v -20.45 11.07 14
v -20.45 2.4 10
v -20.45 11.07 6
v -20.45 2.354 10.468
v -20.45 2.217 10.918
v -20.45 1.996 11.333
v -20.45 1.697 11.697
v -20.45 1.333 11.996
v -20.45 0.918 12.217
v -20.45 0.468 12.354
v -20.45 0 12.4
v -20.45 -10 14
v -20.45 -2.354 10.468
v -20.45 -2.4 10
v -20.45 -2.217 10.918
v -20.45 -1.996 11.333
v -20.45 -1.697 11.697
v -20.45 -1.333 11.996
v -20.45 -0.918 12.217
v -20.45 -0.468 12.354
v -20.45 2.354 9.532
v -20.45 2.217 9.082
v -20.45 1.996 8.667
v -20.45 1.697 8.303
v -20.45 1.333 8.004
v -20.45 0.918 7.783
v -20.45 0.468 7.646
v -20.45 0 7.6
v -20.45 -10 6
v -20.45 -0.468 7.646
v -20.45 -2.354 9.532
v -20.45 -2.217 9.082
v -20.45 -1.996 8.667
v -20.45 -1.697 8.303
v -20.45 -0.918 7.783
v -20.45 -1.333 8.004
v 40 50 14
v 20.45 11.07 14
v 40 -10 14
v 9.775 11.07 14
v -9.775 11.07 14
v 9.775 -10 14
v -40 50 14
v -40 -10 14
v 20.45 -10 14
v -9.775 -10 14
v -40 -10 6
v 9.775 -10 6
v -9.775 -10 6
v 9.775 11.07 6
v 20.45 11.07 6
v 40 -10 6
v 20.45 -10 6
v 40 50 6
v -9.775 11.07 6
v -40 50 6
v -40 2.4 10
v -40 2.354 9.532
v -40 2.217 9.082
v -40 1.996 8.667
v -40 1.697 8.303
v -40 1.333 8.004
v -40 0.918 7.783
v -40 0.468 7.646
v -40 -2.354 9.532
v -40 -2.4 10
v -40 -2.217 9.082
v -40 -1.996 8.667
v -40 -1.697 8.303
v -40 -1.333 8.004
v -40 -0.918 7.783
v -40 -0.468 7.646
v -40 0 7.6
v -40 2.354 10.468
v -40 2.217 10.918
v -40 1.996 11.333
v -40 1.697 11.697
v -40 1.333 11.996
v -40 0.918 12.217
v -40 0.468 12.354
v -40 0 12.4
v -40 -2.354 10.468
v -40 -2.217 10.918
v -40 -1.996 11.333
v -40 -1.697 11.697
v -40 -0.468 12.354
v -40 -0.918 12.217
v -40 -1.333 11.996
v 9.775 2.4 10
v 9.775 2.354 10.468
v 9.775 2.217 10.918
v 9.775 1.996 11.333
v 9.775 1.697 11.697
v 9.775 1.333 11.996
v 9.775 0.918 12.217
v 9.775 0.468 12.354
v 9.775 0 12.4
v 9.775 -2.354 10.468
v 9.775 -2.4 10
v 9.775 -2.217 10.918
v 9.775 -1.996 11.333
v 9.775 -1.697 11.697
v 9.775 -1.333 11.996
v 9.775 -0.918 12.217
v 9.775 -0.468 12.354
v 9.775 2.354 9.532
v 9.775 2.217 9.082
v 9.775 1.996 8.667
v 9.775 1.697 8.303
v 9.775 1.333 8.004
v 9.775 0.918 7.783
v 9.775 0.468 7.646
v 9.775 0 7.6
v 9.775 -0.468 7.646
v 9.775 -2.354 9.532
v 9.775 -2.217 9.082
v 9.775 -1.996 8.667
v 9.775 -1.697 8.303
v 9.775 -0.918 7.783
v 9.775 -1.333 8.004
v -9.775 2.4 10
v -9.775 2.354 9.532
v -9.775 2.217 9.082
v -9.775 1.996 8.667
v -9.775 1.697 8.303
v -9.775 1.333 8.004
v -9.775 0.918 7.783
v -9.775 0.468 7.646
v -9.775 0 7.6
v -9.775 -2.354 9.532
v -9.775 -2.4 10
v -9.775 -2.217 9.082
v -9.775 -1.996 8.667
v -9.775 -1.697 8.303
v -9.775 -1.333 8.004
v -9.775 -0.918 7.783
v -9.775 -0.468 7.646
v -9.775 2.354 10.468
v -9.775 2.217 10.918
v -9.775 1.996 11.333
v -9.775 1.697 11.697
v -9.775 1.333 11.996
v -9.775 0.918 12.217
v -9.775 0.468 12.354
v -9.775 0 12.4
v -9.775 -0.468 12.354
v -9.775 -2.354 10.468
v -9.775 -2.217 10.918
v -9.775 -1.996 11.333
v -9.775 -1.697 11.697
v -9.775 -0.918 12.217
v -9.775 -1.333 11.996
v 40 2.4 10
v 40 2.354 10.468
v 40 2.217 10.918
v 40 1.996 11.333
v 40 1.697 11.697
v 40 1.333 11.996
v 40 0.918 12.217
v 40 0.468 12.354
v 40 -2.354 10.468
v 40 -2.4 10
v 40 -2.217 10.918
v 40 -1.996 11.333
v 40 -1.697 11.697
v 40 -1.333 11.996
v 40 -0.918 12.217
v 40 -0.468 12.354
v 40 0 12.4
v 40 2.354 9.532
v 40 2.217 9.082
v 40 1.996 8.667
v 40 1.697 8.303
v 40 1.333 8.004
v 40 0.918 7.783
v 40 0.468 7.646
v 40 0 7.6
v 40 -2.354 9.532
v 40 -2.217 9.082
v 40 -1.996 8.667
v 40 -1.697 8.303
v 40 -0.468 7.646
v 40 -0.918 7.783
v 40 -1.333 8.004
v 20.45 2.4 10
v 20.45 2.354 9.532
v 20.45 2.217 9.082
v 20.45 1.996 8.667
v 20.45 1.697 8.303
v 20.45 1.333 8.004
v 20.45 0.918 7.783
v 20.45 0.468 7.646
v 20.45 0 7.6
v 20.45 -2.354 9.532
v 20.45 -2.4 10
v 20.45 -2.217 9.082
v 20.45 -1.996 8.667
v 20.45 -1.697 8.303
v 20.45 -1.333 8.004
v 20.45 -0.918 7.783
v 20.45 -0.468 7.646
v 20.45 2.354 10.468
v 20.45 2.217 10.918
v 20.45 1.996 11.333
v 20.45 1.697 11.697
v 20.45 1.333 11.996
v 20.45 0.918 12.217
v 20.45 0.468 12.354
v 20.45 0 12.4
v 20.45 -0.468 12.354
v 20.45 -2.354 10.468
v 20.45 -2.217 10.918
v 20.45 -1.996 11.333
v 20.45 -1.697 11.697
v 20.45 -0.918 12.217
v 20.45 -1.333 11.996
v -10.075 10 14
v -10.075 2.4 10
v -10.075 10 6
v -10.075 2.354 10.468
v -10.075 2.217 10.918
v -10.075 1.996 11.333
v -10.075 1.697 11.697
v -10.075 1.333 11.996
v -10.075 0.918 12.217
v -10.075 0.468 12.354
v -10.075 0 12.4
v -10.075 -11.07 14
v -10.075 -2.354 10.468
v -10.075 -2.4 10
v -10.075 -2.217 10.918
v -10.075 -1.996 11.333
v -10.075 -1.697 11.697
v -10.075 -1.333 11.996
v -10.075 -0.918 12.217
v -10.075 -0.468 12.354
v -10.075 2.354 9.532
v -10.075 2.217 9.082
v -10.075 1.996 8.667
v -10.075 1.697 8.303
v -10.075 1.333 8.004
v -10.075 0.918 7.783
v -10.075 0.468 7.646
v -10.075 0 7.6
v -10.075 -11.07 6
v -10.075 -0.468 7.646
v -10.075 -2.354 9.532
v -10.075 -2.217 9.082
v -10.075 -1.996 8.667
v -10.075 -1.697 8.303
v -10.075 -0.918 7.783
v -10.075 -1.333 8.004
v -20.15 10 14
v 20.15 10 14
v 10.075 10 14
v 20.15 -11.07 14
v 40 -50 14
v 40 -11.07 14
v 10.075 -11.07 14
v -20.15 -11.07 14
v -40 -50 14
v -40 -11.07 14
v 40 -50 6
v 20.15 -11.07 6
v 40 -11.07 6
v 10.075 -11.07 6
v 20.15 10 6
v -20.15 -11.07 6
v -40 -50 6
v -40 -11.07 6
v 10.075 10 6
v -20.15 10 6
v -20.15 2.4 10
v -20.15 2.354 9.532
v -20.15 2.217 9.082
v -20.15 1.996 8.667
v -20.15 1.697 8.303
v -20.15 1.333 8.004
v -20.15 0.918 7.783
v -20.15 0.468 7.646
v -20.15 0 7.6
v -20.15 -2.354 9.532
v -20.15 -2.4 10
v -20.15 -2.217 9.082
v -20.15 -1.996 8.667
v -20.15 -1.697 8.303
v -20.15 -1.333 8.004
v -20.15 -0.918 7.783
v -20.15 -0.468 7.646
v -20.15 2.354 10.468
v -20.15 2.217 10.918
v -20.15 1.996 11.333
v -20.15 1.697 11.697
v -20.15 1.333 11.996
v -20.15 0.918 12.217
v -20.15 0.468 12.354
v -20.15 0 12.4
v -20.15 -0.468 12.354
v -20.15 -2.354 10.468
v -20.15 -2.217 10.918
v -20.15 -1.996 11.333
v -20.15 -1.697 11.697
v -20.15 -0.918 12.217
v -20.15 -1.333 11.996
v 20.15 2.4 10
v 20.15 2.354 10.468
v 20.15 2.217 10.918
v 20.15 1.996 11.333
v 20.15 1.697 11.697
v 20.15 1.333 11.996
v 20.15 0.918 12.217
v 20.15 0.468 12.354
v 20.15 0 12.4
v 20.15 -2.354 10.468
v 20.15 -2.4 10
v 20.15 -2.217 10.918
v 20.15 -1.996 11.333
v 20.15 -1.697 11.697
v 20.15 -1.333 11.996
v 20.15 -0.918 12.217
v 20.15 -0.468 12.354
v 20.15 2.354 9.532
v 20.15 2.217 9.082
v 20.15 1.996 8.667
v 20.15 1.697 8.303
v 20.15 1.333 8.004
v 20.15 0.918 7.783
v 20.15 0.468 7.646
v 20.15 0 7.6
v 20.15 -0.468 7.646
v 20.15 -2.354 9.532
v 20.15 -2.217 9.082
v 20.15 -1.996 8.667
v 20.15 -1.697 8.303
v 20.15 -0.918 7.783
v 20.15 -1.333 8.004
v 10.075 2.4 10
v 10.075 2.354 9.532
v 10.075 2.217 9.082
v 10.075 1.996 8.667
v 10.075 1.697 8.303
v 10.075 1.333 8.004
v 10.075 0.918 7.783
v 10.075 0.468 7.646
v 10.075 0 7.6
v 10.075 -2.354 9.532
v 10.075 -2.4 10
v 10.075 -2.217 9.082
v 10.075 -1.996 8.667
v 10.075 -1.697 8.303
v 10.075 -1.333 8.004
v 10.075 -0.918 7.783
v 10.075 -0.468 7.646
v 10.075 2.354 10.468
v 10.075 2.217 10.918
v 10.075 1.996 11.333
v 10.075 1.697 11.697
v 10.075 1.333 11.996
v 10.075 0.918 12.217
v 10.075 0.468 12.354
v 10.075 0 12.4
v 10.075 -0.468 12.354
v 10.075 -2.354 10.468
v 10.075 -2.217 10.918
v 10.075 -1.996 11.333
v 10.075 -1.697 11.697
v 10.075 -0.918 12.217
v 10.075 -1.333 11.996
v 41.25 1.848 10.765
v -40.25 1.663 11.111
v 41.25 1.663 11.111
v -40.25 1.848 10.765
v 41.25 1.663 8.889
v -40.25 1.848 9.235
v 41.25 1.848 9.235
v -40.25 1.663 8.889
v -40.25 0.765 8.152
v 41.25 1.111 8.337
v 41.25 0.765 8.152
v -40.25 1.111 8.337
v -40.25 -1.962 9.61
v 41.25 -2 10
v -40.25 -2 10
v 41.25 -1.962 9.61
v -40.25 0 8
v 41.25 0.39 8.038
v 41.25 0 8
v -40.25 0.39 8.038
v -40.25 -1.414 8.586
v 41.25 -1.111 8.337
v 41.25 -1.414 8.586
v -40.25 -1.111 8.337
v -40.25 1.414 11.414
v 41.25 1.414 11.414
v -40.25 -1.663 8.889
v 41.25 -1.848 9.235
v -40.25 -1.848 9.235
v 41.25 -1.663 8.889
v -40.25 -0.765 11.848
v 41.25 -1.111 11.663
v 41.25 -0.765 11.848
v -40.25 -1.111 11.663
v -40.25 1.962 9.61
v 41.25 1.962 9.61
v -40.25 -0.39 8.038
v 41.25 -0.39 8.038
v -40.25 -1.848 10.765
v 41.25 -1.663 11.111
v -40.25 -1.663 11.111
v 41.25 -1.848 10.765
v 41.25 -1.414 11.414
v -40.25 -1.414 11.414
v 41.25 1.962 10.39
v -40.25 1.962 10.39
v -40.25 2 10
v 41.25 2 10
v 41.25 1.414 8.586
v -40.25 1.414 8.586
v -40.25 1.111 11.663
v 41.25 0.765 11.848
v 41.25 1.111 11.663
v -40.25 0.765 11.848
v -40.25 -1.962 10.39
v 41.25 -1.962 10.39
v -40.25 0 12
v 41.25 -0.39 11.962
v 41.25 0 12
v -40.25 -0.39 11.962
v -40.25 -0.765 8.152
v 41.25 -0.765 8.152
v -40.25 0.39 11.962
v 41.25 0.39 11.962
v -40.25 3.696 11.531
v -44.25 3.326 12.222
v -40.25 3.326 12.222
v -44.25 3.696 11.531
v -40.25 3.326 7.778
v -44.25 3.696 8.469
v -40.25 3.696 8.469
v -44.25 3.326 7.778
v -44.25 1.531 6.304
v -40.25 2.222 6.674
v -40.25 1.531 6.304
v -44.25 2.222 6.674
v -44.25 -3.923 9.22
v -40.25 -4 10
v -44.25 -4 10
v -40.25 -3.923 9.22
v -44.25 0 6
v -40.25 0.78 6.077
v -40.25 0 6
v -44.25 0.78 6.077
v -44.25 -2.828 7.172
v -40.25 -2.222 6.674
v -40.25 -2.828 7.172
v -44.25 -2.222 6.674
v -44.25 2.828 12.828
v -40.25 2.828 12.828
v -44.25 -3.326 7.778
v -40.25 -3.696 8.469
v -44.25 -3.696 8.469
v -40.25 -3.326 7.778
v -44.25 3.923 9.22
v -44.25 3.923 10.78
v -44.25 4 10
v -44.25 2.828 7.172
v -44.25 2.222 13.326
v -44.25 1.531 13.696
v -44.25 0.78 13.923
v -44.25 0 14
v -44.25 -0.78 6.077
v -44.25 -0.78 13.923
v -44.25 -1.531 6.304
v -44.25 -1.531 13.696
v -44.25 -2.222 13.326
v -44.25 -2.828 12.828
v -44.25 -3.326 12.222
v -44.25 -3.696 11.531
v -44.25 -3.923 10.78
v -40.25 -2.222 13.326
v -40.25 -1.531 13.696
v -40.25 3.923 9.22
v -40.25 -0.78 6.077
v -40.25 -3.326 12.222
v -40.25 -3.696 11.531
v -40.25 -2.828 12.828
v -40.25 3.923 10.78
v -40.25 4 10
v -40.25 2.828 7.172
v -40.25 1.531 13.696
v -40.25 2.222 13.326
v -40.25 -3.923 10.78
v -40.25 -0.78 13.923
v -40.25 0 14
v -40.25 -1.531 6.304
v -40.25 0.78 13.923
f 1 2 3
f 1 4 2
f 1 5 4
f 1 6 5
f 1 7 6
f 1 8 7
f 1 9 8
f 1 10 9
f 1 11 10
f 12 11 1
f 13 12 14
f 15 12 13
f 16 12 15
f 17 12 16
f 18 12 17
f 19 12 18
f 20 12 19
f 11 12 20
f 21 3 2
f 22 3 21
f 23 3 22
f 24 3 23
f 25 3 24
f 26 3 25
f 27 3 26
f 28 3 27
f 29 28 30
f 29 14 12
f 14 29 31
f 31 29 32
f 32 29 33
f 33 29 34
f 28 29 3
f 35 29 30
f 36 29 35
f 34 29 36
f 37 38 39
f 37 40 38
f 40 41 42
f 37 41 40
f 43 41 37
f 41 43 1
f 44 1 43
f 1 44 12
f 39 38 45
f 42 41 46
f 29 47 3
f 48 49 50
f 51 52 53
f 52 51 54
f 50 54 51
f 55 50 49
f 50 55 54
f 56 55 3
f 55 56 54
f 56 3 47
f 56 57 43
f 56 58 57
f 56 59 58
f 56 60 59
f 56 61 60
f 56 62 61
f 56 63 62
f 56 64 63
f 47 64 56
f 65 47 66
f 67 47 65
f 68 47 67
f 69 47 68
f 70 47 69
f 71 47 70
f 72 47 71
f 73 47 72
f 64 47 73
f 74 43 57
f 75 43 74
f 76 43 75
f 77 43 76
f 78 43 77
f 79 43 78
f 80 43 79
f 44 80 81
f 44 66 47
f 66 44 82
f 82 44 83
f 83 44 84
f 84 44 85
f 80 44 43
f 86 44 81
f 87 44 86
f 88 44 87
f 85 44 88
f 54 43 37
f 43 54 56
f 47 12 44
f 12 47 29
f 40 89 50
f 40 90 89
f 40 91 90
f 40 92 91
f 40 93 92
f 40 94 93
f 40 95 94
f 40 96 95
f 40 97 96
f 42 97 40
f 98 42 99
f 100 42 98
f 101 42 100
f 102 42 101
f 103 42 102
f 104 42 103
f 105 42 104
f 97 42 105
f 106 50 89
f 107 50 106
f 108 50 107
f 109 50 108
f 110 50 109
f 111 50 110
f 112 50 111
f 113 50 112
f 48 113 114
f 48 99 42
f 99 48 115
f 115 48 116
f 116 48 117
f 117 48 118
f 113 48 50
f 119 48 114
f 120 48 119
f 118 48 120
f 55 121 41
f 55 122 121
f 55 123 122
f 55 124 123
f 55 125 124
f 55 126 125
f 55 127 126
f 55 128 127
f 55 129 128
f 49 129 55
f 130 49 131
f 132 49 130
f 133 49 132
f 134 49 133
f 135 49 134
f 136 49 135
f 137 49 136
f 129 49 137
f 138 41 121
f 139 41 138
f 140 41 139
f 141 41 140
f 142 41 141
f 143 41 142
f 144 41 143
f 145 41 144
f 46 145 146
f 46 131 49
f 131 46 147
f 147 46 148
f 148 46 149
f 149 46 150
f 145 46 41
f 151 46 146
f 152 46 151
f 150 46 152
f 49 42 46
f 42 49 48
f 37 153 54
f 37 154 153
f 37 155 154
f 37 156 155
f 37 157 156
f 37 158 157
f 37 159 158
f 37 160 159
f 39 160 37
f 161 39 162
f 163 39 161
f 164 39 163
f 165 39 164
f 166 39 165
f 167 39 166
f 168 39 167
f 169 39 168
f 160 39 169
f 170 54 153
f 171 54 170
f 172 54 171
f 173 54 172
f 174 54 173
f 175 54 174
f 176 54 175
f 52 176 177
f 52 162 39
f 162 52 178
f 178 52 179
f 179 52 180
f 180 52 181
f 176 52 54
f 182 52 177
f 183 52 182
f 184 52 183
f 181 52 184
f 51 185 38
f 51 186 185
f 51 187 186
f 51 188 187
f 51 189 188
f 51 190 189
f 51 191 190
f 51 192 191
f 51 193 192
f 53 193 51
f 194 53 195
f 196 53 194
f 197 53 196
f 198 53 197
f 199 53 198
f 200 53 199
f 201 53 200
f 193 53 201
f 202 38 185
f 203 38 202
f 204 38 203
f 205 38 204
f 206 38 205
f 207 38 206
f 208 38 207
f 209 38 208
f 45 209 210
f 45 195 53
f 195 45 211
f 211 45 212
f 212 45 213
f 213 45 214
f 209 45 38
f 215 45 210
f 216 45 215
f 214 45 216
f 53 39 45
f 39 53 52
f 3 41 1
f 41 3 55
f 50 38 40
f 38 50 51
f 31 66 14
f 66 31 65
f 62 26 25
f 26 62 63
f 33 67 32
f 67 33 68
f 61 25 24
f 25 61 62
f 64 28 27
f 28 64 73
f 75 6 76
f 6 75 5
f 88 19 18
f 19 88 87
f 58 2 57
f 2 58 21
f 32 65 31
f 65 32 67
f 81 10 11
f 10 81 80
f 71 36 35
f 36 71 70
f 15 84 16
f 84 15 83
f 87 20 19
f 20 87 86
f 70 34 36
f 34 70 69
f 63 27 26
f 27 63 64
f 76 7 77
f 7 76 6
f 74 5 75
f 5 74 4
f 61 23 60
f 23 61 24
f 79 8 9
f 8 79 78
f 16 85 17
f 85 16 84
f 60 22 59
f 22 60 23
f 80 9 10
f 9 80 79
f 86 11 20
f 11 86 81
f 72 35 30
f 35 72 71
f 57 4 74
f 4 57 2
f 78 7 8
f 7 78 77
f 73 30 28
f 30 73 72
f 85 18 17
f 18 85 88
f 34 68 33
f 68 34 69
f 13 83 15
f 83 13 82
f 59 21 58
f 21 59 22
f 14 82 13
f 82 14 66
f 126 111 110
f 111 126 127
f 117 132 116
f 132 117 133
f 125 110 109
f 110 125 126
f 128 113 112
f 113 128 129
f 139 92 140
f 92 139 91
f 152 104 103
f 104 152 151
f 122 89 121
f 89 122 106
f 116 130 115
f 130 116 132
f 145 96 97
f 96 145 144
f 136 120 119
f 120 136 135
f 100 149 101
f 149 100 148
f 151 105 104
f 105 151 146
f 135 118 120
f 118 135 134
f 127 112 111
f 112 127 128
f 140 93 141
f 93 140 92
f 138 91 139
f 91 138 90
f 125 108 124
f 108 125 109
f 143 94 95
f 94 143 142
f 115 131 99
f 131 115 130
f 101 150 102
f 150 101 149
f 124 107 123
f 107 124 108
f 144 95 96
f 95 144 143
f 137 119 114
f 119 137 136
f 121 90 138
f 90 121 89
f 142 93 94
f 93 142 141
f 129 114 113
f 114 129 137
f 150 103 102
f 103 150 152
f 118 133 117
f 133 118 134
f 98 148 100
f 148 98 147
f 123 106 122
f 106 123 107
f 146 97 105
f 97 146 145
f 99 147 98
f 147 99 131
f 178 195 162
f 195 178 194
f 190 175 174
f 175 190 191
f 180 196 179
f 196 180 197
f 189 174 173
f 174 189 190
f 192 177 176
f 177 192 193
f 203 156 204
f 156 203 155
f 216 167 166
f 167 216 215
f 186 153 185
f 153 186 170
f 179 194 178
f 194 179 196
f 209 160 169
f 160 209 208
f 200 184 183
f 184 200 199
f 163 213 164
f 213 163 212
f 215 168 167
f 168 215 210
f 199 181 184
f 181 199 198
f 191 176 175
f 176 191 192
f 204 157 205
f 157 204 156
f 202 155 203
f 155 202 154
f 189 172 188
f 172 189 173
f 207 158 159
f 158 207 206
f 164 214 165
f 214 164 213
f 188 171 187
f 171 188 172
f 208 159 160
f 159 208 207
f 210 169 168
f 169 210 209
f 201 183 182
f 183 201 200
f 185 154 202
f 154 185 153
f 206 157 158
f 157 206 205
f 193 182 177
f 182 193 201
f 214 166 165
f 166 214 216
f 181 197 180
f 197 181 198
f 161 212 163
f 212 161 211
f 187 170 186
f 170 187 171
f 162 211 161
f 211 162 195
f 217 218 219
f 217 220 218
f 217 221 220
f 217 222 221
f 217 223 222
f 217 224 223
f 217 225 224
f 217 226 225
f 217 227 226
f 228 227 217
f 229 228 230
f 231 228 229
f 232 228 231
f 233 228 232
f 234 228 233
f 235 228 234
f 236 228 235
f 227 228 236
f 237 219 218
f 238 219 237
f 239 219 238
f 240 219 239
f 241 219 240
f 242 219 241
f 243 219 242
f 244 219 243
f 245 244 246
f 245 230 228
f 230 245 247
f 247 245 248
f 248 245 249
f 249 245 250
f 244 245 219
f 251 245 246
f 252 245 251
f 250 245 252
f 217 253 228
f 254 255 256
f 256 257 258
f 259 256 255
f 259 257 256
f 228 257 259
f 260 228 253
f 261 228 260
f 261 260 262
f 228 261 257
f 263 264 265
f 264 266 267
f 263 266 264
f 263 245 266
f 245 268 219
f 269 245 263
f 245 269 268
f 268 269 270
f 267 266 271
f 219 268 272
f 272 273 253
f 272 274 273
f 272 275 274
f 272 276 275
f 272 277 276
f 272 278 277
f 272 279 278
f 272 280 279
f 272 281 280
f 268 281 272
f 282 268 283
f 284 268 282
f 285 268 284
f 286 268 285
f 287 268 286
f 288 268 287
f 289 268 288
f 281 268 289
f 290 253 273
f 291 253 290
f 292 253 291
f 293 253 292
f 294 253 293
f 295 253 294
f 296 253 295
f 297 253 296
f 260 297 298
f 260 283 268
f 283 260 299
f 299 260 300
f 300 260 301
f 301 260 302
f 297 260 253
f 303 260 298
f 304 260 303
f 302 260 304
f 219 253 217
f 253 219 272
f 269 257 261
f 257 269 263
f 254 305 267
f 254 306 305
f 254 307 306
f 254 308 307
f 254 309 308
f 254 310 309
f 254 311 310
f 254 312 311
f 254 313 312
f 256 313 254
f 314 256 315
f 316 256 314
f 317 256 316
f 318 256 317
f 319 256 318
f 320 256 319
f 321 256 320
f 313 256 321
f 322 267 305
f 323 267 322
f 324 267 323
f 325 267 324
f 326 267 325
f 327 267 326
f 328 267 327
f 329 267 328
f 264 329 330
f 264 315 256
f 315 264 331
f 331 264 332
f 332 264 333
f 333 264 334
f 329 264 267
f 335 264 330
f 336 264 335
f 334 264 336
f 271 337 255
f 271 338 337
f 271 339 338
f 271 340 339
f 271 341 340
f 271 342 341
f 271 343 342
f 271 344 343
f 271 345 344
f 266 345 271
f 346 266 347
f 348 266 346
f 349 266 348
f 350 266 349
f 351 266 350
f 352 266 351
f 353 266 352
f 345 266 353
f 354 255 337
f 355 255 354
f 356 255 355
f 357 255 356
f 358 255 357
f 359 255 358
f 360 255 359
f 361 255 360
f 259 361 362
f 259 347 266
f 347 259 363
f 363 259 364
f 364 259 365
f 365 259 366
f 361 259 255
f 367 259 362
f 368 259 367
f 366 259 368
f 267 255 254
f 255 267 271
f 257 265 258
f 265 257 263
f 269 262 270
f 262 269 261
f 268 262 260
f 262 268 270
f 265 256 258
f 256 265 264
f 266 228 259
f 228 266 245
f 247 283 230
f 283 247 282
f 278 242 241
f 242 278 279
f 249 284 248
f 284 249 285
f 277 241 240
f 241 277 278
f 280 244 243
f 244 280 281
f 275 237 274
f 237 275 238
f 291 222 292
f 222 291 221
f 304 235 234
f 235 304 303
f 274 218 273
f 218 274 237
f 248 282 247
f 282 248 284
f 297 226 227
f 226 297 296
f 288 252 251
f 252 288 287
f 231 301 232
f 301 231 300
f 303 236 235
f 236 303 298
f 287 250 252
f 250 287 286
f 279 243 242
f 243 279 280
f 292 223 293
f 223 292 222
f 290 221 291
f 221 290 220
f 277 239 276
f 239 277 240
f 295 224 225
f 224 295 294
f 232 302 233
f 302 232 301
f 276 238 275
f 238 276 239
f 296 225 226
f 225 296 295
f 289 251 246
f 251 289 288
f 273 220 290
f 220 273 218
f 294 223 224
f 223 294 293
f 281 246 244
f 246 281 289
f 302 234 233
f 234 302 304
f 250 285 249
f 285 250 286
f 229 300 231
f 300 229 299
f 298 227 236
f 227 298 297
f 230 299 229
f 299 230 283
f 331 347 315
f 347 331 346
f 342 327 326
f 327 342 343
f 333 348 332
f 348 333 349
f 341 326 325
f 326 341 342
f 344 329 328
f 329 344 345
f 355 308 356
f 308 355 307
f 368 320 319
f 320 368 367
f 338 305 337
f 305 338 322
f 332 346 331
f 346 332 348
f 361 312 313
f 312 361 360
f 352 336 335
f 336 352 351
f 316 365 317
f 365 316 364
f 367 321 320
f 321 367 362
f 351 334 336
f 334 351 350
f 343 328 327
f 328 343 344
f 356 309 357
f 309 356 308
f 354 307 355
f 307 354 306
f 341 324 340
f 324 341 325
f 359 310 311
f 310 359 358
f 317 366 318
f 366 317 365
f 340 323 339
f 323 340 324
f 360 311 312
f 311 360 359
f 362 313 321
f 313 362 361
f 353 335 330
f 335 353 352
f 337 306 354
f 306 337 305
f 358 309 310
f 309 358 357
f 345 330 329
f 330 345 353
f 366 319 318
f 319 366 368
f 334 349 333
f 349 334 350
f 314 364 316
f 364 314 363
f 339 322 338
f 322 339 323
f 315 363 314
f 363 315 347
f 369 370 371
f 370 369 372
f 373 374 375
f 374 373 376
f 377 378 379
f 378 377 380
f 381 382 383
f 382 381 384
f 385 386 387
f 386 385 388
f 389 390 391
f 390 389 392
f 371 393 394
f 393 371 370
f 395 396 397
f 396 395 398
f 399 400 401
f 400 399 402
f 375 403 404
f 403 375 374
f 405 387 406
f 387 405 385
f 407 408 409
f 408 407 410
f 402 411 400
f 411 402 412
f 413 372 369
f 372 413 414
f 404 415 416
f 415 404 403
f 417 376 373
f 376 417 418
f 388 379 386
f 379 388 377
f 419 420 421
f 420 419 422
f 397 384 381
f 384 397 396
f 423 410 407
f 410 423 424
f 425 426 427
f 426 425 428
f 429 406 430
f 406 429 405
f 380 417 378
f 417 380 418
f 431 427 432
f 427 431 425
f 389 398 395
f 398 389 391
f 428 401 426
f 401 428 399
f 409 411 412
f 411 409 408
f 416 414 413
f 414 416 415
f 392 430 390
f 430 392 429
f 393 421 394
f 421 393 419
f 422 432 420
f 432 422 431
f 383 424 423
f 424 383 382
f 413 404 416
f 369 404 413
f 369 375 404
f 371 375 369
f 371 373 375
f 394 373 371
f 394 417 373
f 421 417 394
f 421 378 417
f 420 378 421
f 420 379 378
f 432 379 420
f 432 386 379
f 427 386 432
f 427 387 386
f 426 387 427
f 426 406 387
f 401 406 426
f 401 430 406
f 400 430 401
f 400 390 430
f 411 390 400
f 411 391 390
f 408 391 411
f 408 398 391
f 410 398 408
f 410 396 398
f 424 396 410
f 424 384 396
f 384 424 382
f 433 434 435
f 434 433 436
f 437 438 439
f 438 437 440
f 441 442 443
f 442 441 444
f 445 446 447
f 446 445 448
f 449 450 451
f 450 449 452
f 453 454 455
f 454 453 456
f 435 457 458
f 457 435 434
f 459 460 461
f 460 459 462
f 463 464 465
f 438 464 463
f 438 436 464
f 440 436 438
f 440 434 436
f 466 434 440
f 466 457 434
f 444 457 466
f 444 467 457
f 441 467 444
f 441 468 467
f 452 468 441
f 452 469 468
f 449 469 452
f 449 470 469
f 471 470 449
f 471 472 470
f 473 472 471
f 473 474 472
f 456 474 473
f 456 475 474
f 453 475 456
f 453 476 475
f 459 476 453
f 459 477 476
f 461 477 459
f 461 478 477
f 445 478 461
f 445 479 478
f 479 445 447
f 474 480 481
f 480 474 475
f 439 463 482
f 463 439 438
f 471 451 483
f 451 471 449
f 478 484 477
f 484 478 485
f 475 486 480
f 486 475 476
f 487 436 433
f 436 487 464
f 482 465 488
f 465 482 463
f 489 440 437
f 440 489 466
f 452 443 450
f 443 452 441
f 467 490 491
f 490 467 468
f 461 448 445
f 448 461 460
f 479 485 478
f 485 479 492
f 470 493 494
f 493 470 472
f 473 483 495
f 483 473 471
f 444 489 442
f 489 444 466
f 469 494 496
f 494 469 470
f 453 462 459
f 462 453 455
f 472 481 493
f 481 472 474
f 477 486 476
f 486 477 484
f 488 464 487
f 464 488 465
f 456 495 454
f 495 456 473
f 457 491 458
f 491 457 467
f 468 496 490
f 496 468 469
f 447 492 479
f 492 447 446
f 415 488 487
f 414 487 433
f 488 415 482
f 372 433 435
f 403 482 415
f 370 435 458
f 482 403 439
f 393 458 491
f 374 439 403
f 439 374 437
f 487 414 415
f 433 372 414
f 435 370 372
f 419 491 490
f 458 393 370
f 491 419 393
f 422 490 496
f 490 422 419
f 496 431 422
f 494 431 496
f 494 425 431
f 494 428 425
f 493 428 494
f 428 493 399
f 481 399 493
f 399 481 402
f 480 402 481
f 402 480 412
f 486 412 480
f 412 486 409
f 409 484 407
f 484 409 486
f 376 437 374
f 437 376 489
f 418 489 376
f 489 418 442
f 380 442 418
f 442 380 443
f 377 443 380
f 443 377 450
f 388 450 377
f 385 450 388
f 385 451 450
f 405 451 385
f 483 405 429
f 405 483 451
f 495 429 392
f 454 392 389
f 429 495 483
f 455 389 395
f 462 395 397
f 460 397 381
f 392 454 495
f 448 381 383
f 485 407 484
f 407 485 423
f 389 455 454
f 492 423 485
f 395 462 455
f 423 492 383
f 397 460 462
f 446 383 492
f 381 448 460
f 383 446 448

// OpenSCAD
$fn = 32;

// ------------------------------------------------------------------------
// Butt hinge: hinge 80 mm, leaf swung 0 deg
// Every part is its own module, assembly() places every instance.
// ------------------------------------------------------------------------

// --- part 1 ---
module hinge_base() {
  difference() {
    union() {
      translate([-40, -10, -4]) cube([19.55, 60, 8]);
      translate([-9.775, -10, -4]) cube([19.55, 60, 8]);
      translate([20.45, -10, -4]) cube([19.55, 60, 8]);
      translate([-40, 11.07, -4]) cube([80, 38.93, 8]);
    }
    translate([-30.225, 0, 0]) rotate([0, 90, 0]) cylinder(h = 21.55, d = 4.8, center = true);
    translate([0, 0, 0]) rotate([0, 90, 0]) cylinder(h = 21.55, d = 4.8, center = true);
    translate([30.225, 0, 0]) rotate([0, 90, 0]) cylinder(h = 21.55, d = 4.8, center = true);
  }
}

// --- part 2 ---
module hinge_mover() {
  difference() {
    union() {
      translate([-20.15, -50, -4]) cube([10.075, 60, 8]);
      translate([10.075, -50, -4]) cube([10.075, 60, 8]);
      translate([-40, -50, -4]) cube([80, 38.93, 8]);
    }
    translate([-15.113, 0, 0]) rotate([0, 90, 0]) cylinder(h = 12.075, d = 4.8, center = true);
    translate([15.113, 0, 0]) rotate([0, 90, 0]) cylinder(h = 12.075, d = 4.8, center = true);
  }
}

// --- part 3 ---
module hinge_pin() {
  rotate([0, 90, 0]) cylinder(h = 82.5, d = 4, center = true);
  translate([-44.25, 0, 0]) rotate([0, 90, 0]) cylinder(h = 4, d = 8);
}

// --- assembly ---
module assembly() {
  color([0.80, 0.24, 0.20]) translate([0, 0, 10]) rotate([0, 0, 0]) hinge_base();
  color([0.20, 0.45, 0.75]) translate([0, 0, 10]) rotate([0, 0, 0]) hinge_mover();
  color([0.25, 0.62, 0.32]) translate([0, 0, 10]) rotate([0, 0, 0]) hinge_pin();
}

assembly();
